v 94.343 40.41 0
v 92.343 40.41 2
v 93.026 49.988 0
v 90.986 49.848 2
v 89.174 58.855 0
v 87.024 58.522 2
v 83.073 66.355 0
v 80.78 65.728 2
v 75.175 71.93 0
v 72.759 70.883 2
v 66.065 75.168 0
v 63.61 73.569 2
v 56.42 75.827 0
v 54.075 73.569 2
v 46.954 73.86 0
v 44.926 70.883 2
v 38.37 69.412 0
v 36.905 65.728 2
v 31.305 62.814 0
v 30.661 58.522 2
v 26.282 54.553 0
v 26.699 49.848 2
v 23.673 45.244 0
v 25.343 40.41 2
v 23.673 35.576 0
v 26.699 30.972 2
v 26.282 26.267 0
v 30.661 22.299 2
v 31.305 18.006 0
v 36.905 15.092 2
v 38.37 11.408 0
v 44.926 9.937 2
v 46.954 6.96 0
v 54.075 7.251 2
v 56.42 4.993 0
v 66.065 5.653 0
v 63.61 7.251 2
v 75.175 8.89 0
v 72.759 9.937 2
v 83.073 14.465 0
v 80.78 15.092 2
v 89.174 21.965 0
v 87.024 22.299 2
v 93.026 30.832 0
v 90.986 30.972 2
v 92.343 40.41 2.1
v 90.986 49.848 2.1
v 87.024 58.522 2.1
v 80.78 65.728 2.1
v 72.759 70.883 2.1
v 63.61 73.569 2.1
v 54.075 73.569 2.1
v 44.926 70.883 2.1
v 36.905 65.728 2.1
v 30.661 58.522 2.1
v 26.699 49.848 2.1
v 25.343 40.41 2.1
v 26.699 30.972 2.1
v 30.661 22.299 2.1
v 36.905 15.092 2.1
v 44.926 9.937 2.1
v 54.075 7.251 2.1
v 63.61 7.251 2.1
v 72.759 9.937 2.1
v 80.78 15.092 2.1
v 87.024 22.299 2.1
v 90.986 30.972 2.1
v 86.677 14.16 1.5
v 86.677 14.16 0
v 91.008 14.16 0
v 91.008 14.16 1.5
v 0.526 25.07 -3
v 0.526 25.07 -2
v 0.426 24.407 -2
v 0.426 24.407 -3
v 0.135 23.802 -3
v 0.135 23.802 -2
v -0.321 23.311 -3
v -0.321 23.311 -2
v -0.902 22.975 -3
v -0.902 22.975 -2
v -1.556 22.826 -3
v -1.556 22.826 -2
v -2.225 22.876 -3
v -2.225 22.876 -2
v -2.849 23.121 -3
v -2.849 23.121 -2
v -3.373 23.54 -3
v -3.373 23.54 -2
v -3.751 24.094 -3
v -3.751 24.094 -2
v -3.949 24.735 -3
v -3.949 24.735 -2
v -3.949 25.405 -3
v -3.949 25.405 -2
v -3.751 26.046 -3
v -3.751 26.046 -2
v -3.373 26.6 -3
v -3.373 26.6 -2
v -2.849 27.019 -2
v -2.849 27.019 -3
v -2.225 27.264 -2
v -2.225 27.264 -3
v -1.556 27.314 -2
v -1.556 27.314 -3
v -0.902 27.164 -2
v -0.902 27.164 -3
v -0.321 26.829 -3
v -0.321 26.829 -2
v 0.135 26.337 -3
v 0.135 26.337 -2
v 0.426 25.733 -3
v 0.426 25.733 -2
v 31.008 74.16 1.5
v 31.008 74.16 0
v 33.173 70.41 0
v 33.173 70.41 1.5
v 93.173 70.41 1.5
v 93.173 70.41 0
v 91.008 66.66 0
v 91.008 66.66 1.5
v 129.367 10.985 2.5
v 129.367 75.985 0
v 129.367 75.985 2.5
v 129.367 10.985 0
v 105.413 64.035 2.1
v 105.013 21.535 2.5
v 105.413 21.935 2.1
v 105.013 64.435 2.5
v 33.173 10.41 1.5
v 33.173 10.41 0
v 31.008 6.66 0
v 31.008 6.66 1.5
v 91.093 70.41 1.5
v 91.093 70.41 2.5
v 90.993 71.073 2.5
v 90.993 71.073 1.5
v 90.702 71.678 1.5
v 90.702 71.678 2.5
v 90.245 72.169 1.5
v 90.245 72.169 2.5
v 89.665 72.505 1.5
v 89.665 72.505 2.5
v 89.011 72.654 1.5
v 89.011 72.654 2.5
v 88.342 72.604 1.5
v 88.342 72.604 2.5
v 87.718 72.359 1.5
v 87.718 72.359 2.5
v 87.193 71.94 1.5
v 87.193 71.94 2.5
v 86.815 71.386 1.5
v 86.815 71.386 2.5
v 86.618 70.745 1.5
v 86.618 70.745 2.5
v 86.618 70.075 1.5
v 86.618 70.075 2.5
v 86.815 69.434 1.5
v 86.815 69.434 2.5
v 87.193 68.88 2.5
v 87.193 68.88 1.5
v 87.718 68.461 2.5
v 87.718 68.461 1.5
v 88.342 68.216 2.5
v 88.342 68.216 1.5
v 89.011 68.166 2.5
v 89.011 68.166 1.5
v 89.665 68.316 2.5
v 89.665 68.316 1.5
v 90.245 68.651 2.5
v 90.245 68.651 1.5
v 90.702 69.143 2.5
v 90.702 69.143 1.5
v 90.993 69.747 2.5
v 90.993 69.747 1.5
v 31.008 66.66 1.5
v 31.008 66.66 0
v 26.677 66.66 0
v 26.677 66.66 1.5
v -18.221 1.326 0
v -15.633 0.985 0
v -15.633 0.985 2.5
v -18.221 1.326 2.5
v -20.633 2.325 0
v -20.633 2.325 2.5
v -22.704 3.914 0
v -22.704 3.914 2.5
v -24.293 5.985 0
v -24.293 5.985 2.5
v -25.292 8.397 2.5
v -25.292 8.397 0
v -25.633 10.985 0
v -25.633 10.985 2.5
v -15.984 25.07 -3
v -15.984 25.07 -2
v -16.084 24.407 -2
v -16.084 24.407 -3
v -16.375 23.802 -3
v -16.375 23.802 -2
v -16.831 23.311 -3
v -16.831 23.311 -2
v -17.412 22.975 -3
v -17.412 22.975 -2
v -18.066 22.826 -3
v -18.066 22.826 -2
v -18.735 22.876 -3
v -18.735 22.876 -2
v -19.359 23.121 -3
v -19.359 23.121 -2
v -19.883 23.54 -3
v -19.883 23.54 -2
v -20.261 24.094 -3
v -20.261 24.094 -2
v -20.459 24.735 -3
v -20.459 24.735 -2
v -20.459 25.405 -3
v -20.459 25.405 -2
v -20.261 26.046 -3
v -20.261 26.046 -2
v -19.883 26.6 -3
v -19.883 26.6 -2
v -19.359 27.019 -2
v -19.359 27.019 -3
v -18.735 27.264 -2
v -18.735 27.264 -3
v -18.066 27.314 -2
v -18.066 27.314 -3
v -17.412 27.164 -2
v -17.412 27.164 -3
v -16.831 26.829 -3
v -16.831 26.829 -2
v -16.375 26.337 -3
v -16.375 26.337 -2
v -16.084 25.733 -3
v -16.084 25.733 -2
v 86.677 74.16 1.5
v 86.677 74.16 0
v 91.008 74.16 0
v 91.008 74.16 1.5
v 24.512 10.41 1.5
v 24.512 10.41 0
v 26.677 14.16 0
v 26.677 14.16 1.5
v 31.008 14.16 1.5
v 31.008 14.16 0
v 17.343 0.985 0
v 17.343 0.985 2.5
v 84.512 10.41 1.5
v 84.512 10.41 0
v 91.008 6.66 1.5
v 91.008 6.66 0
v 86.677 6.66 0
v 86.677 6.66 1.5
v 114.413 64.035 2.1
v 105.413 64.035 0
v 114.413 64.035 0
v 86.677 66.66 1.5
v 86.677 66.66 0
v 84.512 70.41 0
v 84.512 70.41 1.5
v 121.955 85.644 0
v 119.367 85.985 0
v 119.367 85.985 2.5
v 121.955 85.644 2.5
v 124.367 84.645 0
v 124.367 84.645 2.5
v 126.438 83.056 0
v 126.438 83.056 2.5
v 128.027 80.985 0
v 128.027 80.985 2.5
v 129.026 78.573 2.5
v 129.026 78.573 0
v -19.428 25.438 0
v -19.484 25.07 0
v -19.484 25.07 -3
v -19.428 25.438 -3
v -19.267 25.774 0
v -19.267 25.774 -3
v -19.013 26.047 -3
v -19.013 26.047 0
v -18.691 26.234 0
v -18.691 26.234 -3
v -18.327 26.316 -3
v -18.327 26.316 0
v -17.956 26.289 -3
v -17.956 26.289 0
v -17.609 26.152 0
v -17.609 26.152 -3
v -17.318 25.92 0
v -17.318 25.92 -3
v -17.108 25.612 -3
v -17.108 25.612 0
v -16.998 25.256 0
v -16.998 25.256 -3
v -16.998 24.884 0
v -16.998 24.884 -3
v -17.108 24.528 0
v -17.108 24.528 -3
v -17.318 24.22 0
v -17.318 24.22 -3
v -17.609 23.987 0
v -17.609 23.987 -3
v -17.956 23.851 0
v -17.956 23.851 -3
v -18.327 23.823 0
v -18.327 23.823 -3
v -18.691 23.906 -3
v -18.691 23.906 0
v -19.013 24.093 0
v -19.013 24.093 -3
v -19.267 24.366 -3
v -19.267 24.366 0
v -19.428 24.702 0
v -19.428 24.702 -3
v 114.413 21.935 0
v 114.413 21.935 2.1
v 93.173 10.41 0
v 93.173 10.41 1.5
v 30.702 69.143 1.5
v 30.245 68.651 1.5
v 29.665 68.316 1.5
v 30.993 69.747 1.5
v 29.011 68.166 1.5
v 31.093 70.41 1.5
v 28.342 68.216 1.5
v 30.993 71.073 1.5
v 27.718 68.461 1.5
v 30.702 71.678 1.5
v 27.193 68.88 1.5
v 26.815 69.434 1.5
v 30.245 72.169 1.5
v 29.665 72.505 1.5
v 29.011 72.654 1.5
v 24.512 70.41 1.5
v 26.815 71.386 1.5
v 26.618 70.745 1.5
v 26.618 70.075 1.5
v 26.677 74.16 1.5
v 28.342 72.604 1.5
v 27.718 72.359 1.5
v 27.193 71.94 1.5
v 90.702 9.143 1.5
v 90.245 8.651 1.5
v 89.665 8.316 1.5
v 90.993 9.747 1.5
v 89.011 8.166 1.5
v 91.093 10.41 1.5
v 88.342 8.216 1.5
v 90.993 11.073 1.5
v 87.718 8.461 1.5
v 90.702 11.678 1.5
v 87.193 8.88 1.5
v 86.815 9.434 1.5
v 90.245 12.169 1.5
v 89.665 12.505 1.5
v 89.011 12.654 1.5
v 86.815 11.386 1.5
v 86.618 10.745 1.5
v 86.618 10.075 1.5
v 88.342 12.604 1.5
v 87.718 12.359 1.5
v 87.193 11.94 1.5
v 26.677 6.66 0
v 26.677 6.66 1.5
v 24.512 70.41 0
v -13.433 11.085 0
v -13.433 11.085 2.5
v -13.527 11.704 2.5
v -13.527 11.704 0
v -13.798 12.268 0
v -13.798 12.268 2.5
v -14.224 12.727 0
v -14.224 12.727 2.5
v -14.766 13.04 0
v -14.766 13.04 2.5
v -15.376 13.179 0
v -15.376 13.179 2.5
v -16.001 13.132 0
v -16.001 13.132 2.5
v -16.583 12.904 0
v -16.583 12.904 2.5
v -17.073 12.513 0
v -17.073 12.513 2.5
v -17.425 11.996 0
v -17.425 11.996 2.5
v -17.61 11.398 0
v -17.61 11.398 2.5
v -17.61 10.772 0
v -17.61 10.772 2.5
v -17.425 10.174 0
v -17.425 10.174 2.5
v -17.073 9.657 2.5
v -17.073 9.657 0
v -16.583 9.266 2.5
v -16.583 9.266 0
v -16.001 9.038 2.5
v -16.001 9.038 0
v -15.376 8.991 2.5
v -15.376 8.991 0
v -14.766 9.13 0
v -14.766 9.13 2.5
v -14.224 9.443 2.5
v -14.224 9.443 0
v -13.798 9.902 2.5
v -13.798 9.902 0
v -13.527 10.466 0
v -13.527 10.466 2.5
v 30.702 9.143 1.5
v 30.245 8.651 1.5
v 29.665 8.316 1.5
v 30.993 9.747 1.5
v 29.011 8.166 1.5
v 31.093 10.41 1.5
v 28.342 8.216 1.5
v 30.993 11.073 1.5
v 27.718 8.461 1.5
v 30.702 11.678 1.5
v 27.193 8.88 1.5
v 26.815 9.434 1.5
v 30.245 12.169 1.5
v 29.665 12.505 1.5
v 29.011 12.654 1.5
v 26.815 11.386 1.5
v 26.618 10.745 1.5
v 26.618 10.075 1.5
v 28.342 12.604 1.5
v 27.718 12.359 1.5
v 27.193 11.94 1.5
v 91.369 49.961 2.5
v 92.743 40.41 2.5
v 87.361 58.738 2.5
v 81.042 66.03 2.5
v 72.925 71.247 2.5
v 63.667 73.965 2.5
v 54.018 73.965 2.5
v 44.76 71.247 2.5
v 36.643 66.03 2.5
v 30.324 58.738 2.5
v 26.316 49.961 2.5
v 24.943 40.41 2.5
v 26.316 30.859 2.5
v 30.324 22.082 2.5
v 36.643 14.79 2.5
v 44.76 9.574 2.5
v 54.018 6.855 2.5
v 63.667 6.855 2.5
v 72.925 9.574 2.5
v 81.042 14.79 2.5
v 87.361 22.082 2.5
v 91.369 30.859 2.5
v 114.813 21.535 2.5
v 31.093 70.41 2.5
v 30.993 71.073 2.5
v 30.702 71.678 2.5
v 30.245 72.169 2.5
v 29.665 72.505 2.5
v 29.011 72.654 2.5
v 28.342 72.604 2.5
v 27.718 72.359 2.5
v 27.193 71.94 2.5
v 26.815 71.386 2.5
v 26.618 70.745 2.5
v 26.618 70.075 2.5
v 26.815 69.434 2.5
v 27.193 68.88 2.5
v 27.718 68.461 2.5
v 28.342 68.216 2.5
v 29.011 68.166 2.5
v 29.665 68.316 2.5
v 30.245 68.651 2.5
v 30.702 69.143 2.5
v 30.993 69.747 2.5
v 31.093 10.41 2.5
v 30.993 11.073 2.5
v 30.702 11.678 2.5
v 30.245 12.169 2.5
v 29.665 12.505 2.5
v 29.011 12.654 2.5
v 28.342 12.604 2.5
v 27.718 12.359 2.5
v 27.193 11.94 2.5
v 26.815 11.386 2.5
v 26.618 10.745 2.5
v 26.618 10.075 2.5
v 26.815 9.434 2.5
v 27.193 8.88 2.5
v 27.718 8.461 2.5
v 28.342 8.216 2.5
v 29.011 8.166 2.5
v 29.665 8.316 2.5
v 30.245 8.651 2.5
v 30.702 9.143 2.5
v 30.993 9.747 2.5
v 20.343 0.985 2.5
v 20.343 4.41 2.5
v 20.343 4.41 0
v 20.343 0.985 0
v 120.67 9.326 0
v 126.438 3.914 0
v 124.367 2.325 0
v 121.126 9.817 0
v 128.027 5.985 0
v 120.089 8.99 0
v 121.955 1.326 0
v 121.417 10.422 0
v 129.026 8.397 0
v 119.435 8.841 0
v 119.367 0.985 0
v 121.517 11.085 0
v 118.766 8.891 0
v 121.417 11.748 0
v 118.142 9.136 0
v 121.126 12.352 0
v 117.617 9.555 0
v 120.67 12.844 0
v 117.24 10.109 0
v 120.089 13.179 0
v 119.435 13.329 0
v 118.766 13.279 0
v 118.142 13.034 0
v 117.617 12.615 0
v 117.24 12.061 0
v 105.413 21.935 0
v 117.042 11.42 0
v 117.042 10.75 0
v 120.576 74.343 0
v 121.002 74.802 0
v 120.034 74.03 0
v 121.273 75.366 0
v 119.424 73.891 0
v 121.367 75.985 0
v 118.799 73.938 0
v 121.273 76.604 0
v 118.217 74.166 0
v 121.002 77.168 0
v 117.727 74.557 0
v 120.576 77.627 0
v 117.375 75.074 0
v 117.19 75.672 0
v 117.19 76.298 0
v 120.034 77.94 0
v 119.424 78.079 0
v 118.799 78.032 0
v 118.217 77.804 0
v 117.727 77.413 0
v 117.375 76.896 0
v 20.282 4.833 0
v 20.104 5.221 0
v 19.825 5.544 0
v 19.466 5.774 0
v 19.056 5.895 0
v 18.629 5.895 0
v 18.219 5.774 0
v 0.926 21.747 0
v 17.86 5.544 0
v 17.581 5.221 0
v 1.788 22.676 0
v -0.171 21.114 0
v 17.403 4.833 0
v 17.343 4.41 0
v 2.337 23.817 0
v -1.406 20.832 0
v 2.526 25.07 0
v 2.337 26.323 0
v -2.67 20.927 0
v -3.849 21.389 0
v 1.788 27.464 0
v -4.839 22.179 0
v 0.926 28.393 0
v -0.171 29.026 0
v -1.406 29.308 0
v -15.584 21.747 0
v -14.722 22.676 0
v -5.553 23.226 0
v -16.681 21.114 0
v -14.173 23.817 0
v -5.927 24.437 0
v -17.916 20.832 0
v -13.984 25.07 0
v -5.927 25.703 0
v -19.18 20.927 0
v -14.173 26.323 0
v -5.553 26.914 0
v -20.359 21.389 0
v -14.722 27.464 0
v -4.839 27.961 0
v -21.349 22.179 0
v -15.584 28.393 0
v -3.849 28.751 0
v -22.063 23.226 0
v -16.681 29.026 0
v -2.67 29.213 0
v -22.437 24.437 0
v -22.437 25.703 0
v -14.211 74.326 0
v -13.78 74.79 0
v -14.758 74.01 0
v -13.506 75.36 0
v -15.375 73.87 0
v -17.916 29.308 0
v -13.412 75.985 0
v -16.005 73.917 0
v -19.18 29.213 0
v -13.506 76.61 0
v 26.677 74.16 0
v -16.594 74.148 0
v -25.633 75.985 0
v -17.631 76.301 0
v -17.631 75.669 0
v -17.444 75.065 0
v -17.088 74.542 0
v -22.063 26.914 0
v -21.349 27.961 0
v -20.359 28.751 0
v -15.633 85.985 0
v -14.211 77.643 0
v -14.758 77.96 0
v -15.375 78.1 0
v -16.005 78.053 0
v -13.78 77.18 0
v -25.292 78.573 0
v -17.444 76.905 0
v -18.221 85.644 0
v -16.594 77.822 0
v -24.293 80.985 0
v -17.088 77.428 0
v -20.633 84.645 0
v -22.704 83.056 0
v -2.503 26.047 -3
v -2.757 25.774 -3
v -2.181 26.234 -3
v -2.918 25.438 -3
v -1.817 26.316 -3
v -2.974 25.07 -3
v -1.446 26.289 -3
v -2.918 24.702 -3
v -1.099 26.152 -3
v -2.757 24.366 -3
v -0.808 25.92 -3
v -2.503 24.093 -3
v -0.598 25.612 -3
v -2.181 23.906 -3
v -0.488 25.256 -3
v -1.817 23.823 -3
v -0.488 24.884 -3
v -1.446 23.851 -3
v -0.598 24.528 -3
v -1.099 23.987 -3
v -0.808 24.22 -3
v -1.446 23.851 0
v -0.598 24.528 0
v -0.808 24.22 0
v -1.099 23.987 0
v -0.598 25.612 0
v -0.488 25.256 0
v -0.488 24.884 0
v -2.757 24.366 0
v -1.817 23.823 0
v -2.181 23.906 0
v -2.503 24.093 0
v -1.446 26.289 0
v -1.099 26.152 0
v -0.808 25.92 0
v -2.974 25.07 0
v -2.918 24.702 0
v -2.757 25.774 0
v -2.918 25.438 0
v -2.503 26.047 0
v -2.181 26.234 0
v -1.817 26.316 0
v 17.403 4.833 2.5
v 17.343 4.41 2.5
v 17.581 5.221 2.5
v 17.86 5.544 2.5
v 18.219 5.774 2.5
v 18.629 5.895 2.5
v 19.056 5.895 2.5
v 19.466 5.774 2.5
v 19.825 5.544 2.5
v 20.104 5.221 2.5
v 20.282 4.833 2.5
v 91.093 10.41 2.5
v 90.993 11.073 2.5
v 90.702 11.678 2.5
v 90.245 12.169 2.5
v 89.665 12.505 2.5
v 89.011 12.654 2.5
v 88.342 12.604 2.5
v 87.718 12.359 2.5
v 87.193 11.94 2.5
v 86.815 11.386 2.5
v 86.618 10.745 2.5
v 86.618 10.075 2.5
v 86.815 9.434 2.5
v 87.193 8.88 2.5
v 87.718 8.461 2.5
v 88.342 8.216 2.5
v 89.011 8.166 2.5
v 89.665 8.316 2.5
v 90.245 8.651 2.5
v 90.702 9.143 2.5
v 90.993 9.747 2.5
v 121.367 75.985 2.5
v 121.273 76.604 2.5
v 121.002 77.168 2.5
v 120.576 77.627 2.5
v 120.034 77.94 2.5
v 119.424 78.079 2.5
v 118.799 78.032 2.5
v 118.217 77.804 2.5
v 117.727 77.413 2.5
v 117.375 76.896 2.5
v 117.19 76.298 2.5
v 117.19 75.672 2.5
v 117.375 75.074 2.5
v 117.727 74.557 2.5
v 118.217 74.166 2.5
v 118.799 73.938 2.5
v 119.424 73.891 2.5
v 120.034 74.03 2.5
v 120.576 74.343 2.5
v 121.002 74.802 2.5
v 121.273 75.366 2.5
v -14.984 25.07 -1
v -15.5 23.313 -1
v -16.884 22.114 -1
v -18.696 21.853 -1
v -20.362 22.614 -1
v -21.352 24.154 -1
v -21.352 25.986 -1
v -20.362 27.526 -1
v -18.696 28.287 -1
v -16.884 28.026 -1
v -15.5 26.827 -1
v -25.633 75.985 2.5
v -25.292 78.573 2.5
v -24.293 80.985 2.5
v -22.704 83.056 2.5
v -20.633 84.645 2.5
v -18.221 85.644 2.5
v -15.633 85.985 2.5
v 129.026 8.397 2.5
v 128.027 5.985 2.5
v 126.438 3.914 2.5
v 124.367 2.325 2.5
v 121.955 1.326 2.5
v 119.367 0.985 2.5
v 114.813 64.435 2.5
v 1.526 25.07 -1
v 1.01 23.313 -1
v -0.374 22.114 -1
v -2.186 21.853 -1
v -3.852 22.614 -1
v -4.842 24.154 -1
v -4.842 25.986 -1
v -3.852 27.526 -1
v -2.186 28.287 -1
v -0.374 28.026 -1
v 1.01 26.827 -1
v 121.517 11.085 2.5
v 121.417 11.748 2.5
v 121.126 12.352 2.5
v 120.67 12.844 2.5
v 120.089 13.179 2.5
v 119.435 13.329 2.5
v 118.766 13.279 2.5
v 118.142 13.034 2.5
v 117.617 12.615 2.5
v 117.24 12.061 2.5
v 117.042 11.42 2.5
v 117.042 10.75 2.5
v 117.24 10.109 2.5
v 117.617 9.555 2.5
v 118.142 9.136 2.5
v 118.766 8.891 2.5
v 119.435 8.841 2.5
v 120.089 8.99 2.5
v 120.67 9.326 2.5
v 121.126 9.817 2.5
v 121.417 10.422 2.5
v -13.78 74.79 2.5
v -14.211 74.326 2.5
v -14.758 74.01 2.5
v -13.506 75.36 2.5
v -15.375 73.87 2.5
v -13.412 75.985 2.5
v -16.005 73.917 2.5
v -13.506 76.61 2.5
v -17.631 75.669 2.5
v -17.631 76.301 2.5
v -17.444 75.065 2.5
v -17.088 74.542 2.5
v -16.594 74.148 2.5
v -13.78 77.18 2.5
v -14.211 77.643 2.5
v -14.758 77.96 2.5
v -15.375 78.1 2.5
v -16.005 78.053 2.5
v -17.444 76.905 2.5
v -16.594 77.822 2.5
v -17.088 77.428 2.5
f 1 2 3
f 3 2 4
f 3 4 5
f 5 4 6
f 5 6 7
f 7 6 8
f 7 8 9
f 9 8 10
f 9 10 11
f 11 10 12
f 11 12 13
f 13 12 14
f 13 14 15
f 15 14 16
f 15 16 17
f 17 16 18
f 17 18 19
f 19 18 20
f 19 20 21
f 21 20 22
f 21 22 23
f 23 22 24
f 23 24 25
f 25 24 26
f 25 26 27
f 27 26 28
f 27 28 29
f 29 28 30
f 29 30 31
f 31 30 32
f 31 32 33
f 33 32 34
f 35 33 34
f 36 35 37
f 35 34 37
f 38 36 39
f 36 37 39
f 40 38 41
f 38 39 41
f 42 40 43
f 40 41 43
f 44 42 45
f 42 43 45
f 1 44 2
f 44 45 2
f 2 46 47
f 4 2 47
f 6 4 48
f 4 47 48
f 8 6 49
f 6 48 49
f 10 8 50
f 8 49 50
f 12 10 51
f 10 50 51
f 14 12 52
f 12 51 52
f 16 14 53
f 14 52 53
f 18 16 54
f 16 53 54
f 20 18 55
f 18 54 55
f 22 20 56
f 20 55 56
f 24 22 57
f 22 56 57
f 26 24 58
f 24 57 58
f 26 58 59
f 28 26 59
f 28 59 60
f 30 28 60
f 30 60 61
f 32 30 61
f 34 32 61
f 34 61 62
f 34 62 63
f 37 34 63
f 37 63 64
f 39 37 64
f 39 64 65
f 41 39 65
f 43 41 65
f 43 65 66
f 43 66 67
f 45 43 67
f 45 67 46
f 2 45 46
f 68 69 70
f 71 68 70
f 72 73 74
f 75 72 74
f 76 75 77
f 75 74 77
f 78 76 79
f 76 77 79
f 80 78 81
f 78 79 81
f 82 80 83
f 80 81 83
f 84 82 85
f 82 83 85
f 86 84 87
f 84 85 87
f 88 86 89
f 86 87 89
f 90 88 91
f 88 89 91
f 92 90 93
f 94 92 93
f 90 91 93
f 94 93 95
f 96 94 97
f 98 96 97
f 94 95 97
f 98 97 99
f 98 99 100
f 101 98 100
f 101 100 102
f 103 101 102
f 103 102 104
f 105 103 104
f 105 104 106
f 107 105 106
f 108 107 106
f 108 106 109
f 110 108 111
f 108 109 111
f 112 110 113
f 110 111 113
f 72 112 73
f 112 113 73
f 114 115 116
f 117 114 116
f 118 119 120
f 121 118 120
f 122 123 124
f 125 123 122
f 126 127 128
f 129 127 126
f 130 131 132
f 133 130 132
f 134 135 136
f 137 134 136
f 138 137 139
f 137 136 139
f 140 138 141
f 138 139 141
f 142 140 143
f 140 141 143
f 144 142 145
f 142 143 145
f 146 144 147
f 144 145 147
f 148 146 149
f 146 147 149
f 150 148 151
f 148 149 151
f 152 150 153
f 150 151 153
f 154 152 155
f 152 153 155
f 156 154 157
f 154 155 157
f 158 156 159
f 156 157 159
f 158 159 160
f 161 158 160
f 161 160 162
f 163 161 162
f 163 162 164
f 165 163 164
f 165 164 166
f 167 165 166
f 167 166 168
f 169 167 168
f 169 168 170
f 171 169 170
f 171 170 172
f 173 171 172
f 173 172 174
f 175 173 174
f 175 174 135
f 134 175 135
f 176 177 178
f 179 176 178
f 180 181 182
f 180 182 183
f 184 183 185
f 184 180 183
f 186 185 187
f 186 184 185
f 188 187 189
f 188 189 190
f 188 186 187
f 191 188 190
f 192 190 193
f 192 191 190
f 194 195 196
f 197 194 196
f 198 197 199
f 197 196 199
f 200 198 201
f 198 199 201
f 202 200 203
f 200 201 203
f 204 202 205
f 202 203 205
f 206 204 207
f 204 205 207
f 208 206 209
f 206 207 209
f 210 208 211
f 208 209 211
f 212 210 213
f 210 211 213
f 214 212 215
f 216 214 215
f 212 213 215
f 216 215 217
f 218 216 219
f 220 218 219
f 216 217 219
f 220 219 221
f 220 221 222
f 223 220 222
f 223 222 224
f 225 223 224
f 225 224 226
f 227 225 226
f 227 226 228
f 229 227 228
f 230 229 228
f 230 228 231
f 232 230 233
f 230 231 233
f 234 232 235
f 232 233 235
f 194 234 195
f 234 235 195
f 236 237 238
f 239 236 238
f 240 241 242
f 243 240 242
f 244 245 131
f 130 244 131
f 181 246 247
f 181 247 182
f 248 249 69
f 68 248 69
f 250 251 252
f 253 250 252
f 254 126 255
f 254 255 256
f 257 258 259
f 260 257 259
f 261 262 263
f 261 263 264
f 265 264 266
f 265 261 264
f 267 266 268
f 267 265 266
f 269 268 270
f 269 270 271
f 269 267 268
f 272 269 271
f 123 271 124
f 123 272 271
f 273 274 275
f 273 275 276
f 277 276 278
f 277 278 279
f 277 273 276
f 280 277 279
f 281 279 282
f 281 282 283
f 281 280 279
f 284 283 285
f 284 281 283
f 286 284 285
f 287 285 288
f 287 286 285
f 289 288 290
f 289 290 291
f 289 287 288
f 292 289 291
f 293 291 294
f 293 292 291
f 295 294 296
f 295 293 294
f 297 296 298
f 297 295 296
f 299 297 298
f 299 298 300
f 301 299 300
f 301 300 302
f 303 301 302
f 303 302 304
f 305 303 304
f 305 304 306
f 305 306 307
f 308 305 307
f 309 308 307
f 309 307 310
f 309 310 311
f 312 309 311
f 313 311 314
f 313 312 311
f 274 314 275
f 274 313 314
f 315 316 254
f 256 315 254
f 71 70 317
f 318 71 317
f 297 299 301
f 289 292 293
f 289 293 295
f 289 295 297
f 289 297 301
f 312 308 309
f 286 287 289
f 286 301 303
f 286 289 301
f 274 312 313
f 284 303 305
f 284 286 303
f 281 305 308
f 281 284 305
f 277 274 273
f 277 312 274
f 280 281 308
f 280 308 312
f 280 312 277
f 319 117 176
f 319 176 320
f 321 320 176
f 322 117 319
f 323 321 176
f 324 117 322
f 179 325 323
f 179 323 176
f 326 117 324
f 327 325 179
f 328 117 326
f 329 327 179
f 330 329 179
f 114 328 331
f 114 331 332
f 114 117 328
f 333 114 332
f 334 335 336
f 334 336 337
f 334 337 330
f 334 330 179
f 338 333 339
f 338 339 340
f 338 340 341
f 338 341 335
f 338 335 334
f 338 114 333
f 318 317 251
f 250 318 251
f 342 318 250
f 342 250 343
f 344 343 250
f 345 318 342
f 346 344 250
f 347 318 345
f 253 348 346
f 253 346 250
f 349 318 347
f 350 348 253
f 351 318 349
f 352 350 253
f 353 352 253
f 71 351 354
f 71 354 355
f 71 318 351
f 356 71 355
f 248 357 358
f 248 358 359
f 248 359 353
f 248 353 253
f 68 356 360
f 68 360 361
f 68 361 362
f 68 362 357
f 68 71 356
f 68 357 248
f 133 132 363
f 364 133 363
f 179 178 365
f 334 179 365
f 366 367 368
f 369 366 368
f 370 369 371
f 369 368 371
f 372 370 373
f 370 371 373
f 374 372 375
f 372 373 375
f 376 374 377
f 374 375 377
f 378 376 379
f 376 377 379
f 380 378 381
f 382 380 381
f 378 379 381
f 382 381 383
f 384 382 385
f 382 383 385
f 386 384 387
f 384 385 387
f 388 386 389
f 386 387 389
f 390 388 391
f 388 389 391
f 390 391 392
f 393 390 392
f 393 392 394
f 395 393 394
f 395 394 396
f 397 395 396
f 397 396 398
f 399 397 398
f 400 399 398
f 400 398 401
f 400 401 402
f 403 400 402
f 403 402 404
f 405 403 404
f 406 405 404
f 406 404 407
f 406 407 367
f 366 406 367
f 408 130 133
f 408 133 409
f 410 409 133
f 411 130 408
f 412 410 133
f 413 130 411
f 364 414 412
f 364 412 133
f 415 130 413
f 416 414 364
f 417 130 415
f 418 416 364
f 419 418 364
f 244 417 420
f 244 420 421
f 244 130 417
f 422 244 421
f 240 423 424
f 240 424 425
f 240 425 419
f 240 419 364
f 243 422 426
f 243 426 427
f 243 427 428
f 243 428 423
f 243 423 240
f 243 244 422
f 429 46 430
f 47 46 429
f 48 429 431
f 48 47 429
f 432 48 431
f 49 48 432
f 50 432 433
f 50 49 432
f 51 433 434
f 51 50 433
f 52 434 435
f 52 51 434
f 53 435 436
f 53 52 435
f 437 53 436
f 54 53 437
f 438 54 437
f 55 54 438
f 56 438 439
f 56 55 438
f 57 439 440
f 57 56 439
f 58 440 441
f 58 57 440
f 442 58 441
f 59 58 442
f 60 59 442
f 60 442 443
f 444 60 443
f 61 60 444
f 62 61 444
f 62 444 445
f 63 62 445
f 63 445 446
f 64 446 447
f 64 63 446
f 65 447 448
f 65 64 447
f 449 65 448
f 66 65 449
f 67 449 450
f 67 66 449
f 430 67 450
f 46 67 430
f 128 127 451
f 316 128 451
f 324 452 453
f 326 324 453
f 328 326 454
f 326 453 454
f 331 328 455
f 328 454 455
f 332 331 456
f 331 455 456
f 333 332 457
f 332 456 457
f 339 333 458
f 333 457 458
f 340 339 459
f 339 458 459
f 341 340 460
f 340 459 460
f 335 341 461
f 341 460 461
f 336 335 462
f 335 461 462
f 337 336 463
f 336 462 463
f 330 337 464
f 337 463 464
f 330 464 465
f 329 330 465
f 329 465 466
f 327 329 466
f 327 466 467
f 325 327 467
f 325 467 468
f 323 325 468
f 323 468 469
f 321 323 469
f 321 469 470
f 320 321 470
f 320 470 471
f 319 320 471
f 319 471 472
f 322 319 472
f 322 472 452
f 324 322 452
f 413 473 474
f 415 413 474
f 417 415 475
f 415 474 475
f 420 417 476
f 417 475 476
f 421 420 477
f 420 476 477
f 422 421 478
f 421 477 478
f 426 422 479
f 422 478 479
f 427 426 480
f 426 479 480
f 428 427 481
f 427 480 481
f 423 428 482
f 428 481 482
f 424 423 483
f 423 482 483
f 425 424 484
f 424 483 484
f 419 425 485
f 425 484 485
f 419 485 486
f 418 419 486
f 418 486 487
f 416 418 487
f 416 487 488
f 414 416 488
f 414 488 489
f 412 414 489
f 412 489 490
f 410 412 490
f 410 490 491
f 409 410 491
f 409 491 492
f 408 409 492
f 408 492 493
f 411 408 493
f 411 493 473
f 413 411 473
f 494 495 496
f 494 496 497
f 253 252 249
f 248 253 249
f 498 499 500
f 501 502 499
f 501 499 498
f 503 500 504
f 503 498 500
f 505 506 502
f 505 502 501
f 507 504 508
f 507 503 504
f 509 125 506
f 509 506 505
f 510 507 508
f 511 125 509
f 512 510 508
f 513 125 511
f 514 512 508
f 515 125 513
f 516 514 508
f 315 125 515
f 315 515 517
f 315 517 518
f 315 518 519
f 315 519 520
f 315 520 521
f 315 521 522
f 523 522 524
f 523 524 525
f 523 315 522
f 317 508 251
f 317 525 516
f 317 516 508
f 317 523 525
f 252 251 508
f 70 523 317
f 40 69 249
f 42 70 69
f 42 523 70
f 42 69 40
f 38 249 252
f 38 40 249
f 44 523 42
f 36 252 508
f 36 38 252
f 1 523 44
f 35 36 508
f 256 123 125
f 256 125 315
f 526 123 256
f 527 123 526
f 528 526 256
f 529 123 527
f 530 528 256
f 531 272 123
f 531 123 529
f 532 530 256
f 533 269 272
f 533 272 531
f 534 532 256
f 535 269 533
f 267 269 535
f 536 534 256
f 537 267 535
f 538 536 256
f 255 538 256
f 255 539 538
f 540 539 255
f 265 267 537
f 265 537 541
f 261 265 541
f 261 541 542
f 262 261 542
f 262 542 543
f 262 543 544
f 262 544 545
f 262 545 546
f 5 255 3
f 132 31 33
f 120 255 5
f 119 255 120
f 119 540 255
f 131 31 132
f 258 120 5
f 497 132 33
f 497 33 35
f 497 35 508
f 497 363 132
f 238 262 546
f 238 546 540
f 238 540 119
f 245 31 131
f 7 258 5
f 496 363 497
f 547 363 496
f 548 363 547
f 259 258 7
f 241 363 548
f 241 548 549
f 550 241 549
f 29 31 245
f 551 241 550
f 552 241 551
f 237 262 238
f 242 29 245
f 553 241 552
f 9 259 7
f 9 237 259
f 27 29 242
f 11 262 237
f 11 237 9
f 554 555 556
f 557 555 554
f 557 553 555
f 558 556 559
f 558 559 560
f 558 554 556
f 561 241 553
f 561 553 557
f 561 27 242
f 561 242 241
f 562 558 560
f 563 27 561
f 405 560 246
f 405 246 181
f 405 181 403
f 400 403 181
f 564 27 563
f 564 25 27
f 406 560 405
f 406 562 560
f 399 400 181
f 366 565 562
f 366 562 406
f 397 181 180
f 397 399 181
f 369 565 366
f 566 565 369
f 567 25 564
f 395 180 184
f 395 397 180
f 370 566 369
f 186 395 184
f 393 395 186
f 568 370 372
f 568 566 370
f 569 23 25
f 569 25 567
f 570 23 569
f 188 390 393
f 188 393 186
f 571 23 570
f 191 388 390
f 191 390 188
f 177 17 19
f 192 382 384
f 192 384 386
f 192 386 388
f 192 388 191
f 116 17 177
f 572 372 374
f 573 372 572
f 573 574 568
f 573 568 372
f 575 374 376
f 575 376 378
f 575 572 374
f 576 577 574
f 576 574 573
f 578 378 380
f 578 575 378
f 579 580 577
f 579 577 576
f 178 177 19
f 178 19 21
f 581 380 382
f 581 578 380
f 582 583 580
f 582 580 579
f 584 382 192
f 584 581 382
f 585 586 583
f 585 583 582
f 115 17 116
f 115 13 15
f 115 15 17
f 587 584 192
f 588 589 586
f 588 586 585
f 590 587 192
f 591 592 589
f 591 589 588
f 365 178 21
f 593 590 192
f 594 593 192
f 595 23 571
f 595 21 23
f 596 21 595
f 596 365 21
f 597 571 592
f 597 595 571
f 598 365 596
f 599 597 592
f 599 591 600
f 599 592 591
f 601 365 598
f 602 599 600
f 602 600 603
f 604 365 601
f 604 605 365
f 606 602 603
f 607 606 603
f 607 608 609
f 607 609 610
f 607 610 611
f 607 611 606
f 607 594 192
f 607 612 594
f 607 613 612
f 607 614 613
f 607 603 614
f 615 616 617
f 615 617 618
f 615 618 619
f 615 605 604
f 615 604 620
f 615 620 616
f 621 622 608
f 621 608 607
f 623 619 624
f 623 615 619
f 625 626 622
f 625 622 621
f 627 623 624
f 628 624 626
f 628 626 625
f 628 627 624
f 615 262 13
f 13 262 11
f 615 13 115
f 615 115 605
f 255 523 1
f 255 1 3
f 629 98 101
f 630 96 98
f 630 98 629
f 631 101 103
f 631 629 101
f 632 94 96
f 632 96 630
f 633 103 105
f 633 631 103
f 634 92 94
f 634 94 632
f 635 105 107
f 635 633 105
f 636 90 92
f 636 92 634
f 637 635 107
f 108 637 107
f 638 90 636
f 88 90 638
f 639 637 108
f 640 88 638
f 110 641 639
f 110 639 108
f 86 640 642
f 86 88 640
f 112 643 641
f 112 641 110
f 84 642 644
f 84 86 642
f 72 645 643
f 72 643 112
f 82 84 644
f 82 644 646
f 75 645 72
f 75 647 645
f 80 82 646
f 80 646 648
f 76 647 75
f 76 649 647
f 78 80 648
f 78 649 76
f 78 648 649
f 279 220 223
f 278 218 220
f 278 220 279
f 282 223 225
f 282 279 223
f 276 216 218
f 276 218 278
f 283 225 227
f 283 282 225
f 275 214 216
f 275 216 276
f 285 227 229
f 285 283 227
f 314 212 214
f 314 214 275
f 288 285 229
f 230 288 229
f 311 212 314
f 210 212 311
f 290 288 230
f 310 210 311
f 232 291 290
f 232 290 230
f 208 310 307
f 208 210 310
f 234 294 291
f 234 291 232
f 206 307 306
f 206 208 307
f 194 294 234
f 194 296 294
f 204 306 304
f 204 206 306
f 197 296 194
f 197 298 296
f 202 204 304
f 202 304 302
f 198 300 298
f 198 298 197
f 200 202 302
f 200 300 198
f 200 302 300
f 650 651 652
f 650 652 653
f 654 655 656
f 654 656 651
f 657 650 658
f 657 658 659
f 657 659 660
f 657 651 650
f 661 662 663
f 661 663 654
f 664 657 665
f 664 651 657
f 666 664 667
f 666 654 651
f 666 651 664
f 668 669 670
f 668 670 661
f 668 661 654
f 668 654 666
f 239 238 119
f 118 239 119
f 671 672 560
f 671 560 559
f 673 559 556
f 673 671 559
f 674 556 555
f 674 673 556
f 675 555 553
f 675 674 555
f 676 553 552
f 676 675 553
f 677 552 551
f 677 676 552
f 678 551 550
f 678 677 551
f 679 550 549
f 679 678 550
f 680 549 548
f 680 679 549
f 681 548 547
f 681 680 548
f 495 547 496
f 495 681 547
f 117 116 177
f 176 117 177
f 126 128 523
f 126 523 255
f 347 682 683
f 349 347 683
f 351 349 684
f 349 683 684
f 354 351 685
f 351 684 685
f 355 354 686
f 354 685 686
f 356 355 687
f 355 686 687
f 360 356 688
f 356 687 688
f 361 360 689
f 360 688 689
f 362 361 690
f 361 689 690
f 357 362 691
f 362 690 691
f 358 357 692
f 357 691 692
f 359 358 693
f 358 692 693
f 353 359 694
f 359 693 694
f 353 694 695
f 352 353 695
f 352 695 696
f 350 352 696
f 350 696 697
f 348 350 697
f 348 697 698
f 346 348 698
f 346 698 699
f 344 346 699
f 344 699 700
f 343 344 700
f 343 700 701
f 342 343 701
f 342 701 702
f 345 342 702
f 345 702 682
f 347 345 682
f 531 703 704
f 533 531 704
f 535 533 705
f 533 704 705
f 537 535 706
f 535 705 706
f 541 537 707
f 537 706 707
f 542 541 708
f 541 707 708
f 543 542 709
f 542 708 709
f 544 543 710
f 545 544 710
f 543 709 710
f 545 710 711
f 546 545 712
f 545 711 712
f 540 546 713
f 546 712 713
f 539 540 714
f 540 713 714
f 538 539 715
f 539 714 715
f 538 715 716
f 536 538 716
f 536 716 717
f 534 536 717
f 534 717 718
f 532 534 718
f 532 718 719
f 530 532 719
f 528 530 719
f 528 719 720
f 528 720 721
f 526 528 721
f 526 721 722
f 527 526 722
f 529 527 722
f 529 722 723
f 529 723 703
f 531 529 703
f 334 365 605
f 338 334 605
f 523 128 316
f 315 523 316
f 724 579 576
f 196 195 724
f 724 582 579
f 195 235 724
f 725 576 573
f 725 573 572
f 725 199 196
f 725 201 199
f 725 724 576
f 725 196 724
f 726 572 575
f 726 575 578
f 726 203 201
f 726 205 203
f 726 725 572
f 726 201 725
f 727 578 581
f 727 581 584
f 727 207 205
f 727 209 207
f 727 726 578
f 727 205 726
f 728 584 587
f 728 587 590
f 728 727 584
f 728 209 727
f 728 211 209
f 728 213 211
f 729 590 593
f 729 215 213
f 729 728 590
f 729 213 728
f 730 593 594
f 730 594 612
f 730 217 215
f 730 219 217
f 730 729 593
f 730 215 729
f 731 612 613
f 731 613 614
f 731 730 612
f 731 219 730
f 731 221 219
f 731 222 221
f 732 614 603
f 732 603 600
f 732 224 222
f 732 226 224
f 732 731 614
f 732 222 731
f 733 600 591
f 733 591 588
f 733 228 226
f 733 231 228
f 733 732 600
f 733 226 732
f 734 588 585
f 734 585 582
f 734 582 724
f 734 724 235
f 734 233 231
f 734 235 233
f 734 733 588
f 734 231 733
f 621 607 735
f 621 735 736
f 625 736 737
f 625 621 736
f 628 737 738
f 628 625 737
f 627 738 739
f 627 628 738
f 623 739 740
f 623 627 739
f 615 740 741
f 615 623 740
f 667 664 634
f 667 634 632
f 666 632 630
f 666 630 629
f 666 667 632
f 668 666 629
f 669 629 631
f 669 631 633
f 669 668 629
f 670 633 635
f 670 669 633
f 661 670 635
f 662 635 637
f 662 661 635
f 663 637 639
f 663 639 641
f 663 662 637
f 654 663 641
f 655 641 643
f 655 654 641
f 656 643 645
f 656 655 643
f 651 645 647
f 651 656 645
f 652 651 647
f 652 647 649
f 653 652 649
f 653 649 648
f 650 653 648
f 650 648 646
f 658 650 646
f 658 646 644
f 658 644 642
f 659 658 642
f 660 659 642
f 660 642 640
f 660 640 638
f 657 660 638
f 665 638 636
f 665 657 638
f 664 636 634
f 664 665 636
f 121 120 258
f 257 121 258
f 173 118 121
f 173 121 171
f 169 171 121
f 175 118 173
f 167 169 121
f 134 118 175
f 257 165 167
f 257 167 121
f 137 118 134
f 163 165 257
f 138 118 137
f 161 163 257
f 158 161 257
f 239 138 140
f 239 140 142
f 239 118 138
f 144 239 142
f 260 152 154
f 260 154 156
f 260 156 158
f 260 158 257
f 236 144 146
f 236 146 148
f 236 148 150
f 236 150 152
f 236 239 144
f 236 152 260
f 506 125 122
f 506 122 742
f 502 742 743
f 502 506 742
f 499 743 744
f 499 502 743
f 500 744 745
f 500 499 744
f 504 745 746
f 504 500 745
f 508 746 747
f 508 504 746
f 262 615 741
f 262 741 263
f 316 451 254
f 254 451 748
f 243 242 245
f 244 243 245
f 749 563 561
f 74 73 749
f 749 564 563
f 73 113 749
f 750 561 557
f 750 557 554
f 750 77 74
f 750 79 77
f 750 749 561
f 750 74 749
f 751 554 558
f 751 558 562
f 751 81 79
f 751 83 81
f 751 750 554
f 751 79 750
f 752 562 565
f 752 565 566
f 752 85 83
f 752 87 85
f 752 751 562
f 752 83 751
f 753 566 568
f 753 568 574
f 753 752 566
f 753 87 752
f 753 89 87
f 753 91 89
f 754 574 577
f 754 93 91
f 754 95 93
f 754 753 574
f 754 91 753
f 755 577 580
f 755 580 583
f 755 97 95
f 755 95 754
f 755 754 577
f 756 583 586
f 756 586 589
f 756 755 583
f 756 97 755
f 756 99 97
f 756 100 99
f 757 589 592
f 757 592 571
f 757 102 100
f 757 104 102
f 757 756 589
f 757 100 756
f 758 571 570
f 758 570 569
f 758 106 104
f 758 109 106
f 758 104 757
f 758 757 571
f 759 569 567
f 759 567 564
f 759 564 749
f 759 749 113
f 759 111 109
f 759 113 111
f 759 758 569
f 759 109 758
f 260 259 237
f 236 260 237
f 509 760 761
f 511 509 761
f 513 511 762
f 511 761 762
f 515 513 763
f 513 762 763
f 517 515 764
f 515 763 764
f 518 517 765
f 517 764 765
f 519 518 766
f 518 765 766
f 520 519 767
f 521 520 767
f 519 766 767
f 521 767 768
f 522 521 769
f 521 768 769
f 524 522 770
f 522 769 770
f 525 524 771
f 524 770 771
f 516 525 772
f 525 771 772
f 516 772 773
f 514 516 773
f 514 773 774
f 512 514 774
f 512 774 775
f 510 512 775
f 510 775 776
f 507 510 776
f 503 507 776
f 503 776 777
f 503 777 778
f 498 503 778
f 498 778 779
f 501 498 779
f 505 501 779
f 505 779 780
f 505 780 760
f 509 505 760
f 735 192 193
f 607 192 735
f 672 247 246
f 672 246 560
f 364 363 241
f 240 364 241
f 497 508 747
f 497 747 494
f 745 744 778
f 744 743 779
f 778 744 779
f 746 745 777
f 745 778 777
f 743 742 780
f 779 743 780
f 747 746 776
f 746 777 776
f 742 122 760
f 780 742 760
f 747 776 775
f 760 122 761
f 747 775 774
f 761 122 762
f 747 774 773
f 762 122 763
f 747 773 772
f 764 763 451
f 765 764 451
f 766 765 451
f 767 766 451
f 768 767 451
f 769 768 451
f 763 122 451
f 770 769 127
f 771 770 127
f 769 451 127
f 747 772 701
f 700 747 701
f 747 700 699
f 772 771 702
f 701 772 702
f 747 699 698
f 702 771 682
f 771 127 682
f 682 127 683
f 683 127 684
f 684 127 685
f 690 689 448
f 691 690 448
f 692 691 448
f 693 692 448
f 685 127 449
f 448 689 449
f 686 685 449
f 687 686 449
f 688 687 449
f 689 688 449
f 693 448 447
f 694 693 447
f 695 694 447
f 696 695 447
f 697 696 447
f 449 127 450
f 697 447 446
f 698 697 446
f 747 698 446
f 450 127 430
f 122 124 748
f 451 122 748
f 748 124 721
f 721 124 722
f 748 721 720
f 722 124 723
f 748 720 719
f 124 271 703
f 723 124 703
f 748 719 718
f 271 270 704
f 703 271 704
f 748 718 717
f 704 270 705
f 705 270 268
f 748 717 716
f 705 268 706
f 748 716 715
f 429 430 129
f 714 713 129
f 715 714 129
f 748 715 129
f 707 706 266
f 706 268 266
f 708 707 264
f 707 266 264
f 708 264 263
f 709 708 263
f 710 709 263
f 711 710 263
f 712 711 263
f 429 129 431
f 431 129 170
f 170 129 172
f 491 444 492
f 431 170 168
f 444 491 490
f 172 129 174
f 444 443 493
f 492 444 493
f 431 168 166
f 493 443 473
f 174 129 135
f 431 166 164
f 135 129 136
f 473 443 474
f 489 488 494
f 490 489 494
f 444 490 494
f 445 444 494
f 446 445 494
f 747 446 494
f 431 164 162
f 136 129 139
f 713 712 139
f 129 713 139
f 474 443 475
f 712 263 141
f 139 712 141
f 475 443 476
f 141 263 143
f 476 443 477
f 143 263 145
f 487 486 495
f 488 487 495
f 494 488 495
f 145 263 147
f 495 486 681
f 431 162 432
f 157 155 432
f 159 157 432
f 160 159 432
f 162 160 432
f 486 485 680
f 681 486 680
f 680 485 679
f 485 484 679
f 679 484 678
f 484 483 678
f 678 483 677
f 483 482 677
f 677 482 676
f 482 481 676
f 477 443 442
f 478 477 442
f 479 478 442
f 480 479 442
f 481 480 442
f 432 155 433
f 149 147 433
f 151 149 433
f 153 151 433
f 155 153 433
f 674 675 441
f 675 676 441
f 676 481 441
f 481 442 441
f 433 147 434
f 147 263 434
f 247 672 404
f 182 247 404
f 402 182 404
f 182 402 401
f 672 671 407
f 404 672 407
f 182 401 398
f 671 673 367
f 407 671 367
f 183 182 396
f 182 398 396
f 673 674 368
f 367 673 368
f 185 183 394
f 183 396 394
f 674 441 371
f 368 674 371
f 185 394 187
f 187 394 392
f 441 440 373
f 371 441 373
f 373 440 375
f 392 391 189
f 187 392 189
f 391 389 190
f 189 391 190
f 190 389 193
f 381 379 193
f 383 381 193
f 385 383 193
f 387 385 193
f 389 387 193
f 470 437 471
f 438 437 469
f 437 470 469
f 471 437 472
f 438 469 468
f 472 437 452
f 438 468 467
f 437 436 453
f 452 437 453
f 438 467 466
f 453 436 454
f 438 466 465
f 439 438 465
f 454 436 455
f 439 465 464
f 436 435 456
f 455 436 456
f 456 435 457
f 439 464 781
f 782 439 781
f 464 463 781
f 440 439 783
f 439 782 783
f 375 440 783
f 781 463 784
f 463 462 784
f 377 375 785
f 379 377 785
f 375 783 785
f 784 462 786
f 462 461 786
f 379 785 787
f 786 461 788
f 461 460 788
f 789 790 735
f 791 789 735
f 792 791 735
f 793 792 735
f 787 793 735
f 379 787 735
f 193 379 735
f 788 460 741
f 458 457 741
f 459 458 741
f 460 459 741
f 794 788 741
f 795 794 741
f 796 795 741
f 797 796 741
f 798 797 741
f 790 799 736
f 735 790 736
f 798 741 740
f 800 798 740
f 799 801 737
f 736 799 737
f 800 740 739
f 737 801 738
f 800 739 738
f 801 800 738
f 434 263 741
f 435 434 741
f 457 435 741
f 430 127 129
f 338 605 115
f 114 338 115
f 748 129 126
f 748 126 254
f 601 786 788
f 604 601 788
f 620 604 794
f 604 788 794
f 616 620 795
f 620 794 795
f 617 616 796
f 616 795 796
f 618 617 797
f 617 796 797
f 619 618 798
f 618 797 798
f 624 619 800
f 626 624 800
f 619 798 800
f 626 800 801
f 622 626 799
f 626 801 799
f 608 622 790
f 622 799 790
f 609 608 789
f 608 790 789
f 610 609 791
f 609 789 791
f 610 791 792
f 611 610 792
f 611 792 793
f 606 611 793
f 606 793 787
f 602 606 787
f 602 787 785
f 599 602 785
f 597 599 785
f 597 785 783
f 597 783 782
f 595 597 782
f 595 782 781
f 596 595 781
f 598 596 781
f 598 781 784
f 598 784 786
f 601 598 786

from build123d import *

# Parameters (mm, degrees)
BOSS_EXTRUDE1_DEPTH = 2.5
SKETCH3_R           = 2.25
SKETCH3_R_2         = 2.1
SKETCH3_R_3         = 2.121320344
CUT_EXTRUDE1_DEPTH  = 3
SKETCH4_R           = 33.5
SKETCH4_R_2         = 2.25
CUT_EXTRUDE2_DEPTH  = 5
CUT_EXTRUDE3_DEPTH  = 1.5
CHAMFER1_SIZE       = 2
CUT_EXTRUDE4_DEPTH  = 3
SKETCH7_R           = 2.25
SKETCH7_R_2         = 1.25
BOSS_EXTRUDE2_DEPTH = 3
CHAMFER2_SIZE       = 2
SKETCH12_W          = 9
SKETCH12_H          = 42.1
CUT_EXTRUDE5_DEPTH  = 7
CHAMFER3_SIZE       = 0.4


with BuildPart() as part:
    # Sketch1 → Boss-Extrude1 (new body)
    with BuildSketch(Plane.XY):
        with BuildLine():
            Line((-15.633211847, 85.984955899), (119.366788153, 85.984955899))
            ThreePointArc((119.366788153, 85.984955899), (126.437855965, 83.05602371), (129.366788153, 75.984955899))
            Line((129.366788153, 75.984955899), (129.366788153, 10.984955899))
            ThreePointArc((129.366788153, 10.984955899), (126.437855965, 3.913888087), (119.366788153, 0.984955899))
            Line((119.366788153, 0.984955899), (-15.633211847, 0.984955899))
            ThreePointArc((-15.633211847, 0.984955899), (-22.704279659, 3.913888087), (-25.633211847, 10.984955899))
            Line((-25.633211847, 10.984955899), (-25.633211847, 75.984955899))
            ThreePointArc((-25.633211847, 75.984955899), (-22.704279659, 83.05602371), (-15.633211847, 85.984955899))
        make_face()
    extrude(amount=BOSS_EXTRUDE1_DEPTH)

    # Sketch3 → Cut-Extrude1 (cut)
    with BuildSketch(Plane.XY.offset(2.5)):
        with Locations((119.266788153, 11.084955899)):
            Circle(SKETCH3_R)
        with Locations((119.266788153, 75.984955899)):
            Circle(SKETCH3_R_2)
        with Locations((-15.533211847, 75.984955899)):
            Circle(SKETCH3_R_3)
        with Locations((-15.533211847, 11.084955899)):
            Circle(SKETCH3_R_2)
    extrude(amount=-CUT_EXTRUDE1_DEPTH, mode=Mode.SUBTRACT)

    # Sketch4 → Cut-Extrude2 (cut)
    with BuildSketch(Plane.XY.offset(2.5)):
        with Locations((58.842502754, 40.410046739)):
            Circle(SKETCH4_R)
        with Locations((28.842502754, 70.410046739)):
            Circle(SKETCH4_R_2)
        with Locations((88.842502754, 70.410046739)):
            Circle(SKETCH4_R_2)
        with Locations((88.842502754, 10.410046739)):
            Circle(SKETCH4_R_2)
        with Locations((28.842502754, 10.410046739)):
            Circle(SKETCH4_R_2)
    extrude(amount=-CUT_EXTRUDE2_DEPTH, mode=Mode.SUBTRACT)

    # Sketch5 → Cut-Extrude3 (cut)
    with BuildSketch(Plane(origin=(0, 0, 0), x_dir=(-1, 0, 0), z_dir=(0, 0, -1))):
        Polygon((-93.172629773, 10.410046739), (-91.007566263, 6.660046739), (-86.677439244, 6.660046739), (-84.512375735, 10.410046739), (-86.677439244, 14.160046739), (-91.007566263, 14.160046739), align=None)
        Polygon((-33.172629773, 10.410046739), (-31.007566263, 6.660046739), (-26.677439244, 6.660046739), (-24.512375735, 10.410046739), (-26.677439244, 14.160046739), (-31.007566263, 14.160046739), align=None)
        Polygon((-93.172629773, 70.410046739), (-91.007566263, 66.660046739), (-86.677439244, 66.660046739), (-84.512375735, 70.410046739), (-86.677439244, 74.160046739), (-91.007566263, 74.160046739), align=None)
        Polygon((-33.172629773, 70.410046739), (-31.007566263, 66.660046739), (-26.677439244, 66.660046739), (-24.512375735, 70.410046739), (-26.677439244, 74.160046739), (-31.007566263, 74.160046739), align=None)
    extrude(amount=-CUT_EXTRUDE3_DEPTH, mode=Mode.SUBTRACT)

    # Chamfer1
    chamfer1_edges = [part.edges().sort_by_distance(p)[0] for p in [
        (25.342502754, 40.410046739, 0),
    ]]
    chamfer(chamfer1_edges, length=CHAMFER1_SIZE)

    # Sketch6 → Cut-Extrude4 (cut)
    with BuildSketch(Plane.XY.offset(2.5)):
        with BuildLine():
            Line((20.342502754, 4.410046739), (20.342502754, 0.984955899))
            ThreePointArc((20.342502754, 0.984955899), (18.842502754, -0.515044101), (17.342502754, 0.984955899))
            Line((17.342502754, 0.984955899), (17.342502754, 4.410046739))
            ThreePointArc((17.342502754, 4.410046739), (18.842502754, 5.910046739), (20.342502754, 4.410046739))
        make_face()
    extrude(amount=-CUT_EXTRUDE4_DEPTH, mode=Mode.SUBTRACT)

    # Sketch7 → Boss-Extrude2 (add)
    # profile 1 of 2: a face of its own
    with BuildSketch(Plane(origin=(0, 0, 0), x_dir=(-1, 0, 0), z_dir=(0, 0, -1))):
        with Locations(Location((18.233971147, 25.069955899, 0), (0, 0, 180))):
            Circle(SKETCH7_R)
        with Locations((18.233971147, 25.069955899)):
            Circle(SKETCH7_R_2, mode=Mode.SUBTRACT)
    # profile 2 of 2: a face of its own
    with BuildSketch(Plane(origin=(0, 0, 0), x_dir=(-1, 0, 0), z_dir=(0, 0, -1))):
        with Locations(Location((1.723971147, 25.069955899, 0), (0, 0, 180))):
            Circle(SKETCH7_R)
        with Locations((1.723971147, 25.069955899)):
            Circle(SKETCH7_R_2, mode=Mode.SUBTRACT)
    extrude(amount=BOSS_EXTRUDE2_DEPTH)

    # Chamfer2
    chamfer2_edges = [part.edges().sort_by_distance(p)[0] for p in [
        (-20.483971147, 25.069955899, 0),
        (-3.973971147, 25.069955899, 0),
    ]]
    chamfer(chamfer2_edges, length=CHAMFER2_SIZE)

    # Sketch12 → Cut-Extrude5 (cut)
    with BuildSketch(Plane.XY.offset(2.5)):
        with Locations((109.912689541, 42.984621363)):
            Rectangle(SKETCH12_W, SKETCH12_H)
    extrude(amount=-CUT_EXTRUDE5_DEPTH, mode=Mode.SUBTRACT)

    # Chamfer3
    chamfer3_edges = [part.edges().sort_by_distance(p)[0] for p in [
        (105.412689541, 42.984621363, 2.5),
        (109.912689541, 21.934621363, 2.5),
        (114.412689541, 42.984621363, 2.5),
        (109.912689541, 64.034621363, 2.5),
        (25.342502754, 40.410046739, 2.5),
    ]]
    chamfer(chamfer3_edges, length=CHAMFER3_SIZE)


solid = part.part
